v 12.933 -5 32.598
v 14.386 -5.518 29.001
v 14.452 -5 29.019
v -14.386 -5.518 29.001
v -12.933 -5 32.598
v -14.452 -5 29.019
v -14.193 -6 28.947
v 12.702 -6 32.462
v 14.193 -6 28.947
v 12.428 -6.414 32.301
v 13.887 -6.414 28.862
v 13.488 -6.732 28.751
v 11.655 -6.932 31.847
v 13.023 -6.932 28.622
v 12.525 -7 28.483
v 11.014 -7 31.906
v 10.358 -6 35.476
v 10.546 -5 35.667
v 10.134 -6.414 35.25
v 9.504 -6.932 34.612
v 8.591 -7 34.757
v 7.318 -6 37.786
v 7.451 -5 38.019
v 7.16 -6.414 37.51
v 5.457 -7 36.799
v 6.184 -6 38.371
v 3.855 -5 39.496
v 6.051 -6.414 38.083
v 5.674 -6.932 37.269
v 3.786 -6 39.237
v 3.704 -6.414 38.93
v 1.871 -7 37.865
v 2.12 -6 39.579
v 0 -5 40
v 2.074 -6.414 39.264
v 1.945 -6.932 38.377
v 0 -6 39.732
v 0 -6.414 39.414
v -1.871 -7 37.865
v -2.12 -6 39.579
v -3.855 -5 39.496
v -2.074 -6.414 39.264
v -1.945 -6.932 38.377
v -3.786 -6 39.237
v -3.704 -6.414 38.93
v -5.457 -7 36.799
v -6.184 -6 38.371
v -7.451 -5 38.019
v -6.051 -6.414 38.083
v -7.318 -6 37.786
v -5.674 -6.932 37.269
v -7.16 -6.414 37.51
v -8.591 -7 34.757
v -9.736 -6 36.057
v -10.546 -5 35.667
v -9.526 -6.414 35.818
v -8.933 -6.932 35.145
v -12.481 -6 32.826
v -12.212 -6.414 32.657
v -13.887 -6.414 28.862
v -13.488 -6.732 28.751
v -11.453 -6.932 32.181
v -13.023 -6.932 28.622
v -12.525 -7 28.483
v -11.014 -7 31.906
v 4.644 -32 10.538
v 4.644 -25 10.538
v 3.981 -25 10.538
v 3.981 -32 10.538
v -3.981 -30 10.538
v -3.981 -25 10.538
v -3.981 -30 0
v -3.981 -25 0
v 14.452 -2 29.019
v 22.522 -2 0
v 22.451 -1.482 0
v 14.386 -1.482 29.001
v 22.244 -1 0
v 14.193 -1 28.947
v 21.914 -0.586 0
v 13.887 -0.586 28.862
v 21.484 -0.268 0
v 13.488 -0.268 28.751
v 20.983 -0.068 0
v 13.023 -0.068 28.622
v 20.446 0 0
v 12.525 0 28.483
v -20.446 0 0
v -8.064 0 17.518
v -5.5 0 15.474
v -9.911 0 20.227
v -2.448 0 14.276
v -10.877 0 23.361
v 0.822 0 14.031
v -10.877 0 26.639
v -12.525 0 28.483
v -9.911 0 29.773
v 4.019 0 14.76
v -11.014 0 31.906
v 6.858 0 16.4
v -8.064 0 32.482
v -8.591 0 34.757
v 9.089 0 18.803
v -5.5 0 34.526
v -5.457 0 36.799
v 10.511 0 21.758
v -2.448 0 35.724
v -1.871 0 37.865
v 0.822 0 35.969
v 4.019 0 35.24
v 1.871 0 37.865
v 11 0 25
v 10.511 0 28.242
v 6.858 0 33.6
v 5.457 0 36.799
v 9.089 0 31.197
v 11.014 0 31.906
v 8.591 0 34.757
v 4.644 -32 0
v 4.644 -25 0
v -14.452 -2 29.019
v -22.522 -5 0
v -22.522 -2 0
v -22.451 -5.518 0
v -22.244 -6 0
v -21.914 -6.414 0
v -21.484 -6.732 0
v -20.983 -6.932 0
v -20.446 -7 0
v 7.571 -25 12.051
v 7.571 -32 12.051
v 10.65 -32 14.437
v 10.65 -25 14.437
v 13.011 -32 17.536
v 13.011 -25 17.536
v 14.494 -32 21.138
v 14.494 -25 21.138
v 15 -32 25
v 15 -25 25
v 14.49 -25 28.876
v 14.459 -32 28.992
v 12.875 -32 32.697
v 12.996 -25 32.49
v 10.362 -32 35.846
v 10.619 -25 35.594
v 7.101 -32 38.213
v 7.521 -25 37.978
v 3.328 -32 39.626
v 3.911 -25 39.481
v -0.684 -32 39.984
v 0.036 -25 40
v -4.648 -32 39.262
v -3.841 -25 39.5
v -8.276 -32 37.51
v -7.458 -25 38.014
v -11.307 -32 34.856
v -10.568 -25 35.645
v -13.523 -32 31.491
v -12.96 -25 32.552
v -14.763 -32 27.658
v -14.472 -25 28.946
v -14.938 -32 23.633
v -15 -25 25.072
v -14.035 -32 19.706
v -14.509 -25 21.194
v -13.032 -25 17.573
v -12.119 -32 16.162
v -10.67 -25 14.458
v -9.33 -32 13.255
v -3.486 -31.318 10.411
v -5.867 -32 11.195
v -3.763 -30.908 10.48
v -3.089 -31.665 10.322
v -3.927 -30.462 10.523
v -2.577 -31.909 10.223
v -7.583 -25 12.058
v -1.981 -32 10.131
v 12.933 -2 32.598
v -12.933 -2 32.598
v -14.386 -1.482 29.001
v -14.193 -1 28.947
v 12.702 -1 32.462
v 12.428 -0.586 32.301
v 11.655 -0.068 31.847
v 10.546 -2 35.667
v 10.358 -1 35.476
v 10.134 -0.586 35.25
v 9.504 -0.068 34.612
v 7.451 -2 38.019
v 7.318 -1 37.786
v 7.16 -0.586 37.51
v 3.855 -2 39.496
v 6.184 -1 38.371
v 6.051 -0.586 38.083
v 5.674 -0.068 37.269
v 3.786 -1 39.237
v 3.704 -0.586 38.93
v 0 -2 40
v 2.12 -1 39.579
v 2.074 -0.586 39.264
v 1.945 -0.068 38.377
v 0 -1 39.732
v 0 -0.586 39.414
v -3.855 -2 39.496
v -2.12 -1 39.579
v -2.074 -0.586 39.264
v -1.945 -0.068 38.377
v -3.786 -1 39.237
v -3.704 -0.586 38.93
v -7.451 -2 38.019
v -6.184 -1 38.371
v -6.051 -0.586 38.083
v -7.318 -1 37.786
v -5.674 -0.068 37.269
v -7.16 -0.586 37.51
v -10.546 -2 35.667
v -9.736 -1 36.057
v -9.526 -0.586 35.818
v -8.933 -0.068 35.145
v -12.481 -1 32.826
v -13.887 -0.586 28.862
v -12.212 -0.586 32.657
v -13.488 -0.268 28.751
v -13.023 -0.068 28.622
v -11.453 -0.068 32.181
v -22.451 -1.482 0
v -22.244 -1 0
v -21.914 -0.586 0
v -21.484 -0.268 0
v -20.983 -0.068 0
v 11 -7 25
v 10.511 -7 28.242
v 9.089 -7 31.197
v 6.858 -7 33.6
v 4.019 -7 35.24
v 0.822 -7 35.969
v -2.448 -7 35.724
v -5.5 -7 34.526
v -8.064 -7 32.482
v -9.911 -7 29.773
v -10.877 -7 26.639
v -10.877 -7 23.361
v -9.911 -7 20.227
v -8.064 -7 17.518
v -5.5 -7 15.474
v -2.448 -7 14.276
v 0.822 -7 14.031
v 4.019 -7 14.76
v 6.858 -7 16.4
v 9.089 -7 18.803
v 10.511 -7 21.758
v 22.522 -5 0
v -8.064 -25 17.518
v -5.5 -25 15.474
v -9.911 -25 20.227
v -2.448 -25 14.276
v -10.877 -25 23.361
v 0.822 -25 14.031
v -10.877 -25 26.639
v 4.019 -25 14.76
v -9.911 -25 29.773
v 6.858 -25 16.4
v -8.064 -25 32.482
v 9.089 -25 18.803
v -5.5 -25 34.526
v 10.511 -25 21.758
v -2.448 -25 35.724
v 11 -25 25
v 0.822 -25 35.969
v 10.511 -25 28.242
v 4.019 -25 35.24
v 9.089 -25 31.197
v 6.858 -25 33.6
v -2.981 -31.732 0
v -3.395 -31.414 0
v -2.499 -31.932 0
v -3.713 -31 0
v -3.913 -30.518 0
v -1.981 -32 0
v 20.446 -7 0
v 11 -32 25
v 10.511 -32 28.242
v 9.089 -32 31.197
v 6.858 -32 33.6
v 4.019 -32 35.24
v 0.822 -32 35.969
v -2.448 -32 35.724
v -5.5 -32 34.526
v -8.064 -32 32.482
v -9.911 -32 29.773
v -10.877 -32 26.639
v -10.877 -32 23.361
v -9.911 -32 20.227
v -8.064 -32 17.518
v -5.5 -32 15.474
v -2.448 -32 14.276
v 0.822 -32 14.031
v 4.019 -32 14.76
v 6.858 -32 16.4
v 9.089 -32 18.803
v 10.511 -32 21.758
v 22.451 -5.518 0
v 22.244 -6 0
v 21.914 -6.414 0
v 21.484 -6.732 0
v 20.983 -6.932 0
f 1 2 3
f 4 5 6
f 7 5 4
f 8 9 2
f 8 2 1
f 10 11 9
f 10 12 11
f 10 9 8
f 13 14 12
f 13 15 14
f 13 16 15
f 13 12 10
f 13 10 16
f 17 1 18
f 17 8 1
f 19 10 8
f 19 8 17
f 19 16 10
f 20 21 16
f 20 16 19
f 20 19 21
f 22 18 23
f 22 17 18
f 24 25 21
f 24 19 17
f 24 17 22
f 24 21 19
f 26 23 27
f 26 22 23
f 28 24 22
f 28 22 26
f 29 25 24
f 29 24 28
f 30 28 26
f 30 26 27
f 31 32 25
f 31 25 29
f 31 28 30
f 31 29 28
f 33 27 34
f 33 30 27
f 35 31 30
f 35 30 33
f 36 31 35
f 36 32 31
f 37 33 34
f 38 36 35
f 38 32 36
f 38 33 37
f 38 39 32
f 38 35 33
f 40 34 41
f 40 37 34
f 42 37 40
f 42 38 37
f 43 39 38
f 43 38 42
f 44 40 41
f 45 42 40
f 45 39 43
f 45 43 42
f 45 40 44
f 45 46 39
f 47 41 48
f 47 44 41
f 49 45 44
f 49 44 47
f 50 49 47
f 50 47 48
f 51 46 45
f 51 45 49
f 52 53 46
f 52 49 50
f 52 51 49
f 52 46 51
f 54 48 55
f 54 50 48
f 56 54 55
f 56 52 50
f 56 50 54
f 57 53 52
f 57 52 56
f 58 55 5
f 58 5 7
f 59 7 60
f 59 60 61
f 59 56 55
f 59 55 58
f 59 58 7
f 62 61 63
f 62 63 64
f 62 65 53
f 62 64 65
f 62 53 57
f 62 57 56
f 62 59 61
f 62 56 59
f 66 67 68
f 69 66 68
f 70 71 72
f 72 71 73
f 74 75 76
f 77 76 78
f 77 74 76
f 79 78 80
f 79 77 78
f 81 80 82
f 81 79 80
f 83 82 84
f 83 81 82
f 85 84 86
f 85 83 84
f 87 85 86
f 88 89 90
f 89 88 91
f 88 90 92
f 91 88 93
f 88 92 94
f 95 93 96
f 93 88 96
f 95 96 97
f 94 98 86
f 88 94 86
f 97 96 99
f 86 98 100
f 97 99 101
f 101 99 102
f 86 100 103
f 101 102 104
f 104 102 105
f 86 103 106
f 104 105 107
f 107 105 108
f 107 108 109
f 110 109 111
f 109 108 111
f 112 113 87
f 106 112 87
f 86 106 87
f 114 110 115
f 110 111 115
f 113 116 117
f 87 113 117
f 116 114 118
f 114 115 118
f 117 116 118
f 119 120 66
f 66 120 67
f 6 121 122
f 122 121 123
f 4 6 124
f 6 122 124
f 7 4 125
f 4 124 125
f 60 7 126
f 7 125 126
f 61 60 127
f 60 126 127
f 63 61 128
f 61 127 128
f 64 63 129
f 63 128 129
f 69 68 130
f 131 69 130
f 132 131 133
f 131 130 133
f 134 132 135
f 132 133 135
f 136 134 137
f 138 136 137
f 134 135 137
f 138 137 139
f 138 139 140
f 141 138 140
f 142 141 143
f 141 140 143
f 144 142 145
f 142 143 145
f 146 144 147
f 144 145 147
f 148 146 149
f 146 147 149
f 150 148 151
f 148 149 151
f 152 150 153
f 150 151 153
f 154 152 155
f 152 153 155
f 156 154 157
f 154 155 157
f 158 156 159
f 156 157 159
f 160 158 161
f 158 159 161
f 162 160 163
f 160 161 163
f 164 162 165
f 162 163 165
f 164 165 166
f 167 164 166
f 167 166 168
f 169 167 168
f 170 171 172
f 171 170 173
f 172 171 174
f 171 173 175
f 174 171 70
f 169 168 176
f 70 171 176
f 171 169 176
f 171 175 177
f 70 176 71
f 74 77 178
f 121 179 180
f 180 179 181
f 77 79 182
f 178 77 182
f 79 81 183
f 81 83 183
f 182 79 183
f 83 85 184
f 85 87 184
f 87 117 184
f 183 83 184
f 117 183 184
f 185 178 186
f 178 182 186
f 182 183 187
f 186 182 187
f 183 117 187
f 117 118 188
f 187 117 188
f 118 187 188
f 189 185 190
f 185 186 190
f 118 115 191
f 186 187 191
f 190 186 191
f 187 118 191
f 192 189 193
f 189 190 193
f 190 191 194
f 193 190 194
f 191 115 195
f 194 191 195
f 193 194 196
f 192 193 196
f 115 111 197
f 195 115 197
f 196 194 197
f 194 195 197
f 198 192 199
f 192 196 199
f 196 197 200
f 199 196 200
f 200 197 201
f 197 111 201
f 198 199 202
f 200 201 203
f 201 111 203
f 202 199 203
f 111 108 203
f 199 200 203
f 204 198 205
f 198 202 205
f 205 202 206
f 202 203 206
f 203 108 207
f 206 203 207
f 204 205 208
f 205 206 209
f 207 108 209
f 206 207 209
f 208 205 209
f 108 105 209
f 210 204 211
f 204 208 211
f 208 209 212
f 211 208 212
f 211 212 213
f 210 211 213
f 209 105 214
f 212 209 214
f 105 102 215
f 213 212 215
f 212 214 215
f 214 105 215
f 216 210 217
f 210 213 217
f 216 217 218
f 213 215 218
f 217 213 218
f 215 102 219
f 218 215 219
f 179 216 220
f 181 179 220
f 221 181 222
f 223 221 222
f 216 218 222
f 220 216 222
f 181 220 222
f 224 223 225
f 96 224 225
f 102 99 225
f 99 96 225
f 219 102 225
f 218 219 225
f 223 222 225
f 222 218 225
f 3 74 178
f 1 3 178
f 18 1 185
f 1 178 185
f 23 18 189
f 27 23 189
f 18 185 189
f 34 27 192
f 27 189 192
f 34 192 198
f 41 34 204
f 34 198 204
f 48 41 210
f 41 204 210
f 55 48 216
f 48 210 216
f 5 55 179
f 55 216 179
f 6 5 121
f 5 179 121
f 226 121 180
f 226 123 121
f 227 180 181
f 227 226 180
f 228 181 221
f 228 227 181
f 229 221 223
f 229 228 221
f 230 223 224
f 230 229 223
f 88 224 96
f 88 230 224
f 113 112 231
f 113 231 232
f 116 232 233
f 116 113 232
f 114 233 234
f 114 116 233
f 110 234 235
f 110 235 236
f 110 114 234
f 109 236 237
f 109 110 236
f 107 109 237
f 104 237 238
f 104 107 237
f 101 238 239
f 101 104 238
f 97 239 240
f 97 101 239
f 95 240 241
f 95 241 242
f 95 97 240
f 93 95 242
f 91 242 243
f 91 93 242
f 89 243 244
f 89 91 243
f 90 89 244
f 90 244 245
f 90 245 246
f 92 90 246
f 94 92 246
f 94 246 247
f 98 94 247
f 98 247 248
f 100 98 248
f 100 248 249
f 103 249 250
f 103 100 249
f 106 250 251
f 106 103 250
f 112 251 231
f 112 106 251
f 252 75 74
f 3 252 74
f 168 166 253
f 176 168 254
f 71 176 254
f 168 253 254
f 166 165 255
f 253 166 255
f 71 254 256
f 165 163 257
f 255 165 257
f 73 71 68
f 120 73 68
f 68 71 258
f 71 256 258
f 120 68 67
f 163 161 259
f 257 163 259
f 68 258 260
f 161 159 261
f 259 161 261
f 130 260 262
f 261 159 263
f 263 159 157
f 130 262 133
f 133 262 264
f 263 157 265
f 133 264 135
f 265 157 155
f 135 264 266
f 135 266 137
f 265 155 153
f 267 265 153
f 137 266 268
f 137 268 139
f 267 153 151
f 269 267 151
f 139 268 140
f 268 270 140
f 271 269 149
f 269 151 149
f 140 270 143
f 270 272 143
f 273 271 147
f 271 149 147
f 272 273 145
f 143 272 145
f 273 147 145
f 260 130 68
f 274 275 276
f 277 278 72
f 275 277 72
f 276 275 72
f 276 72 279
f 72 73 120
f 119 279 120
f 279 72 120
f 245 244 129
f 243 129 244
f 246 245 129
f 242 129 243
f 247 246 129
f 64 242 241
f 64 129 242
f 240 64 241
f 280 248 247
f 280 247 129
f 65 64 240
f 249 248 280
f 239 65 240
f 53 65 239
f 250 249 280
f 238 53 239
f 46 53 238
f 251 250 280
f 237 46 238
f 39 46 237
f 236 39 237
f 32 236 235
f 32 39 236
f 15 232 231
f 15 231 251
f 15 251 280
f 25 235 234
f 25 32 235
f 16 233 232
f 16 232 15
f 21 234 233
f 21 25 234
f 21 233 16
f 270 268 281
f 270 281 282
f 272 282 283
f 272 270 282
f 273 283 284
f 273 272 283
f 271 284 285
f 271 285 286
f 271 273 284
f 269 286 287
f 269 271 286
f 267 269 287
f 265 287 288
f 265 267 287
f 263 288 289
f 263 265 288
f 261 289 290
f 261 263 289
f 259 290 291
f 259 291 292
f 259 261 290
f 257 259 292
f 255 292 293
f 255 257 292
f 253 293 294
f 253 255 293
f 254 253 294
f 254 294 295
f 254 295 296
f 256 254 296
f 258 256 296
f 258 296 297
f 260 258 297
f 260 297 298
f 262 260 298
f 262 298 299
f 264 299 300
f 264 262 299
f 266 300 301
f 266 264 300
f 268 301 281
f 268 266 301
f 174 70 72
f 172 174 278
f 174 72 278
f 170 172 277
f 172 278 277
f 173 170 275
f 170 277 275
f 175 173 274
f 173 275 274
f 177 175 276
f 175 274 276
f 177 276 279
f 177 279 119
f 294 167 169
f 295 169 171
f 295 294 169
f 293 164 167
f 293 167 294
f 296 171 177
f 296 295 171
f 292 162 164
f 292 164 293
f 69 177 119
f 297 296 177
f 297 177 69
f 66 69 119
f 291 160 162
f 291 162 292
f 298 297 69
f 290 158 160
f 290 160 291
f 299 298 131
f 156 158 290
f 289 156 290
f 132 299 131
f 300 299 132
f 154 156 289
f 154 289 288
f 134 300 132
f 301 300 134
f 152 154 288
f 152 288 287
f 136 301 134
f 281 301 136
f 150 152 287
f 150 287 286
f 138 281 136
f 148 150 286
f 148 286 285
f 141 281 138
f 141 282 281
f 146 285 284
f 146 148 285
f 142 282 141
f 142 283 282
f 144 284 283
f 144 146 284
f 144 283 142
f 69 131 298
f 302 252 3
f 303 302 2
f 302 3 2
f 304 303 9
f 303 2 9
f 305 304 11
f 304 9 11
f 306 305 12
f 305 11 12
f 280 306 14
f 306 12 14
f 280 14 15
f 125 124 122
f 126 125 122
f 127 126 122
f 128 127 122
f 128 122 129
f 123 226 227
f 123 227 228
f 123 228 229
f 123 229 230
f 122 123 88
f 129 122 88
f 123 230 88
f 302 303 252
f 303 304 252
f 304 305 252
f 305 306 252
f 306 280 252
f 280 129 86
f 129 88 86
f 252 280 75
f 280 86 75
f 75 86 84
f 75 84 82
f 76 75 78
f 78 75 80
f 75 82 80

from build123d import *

# Parameters (mm, degrees)
F0_R     = 11
F2_DEPTH = 7
F4_R     = 11
F5_DEPTH = 7
F6_R     = 2
F6_2_R   = 2


with BuildPart() as f2:
    # F0 (on Front) → F2 (new body)
    with BuildSketch(Plane.XZ):
        with BuildLine():
            ThreePointArc((14.4515297125, 29.0191154462), (14.8622499253, 27.0281832157), (15, 25))
            ThreePointArc((15, 25), (-2.0281832157, 10.1377500747), (-14.4515297125, 29.0191154462))
            Line((-14.4515297125, 29.0191154462), (-22.5220369491, 0))
            Line((-22.5220369491, 0), (0, 0))
            Line((0, 0), (22.5220369491, 0))
            Line((22.5220369491, 0), (14.4515297125, 29.0191154462))
        make_face()
        with BuildLine():
            ThreePointArc((-14.4515297125, 29.0191154462), (-2.0281832157, 10.1377500747), (15, 25))
            ThreePointArc((15, 25), (14.8622499253, 27.0281832157), (14.4515297125, 29.0191154462))
            ThreePointArc((14.4515297125, 29.0191154462), (0, 40), (-14.4515297125, 29.0191154462))
        make_face()
        with Locations((0, 25)):
            Circle(F0_R, mode=Mode.SUBTRACT)
    extrude(amount=F2_DEPTH)

    # F6
    f6_edges = [f2.edges().sort_by_distance(p)[0] for p in [
        (-18.486783, -7, 14.509558),
        (18.486783, 0, 14.509558),
    ]]
    fillet(f6_edges, radius=F6_R)


with BuildPart() as f5:
    # F4 (on offset) → F5 (new body)
    with BuildSketch(Plane.XZ.offset(25)):
        with BuildLine():
            ThreePointArc((3.9812427399, 10.5379909333), (11.9314425175, 15.9093080873), (15, 25))
            ThreePointArc((15, 25), (-9.0906919127, 36.9314425175), (-3.9812427399, 10.5379909333))
            Line((-3.9812427399, 10.5379909333), (3.9812427399, 10.5379909333))
        make_face()
        with Locations((0, 25)):
            Circle(F4_R, mode=Mode.SUBTRACT)
        with BuildLine():
            Line((3.9812427399, 10.5379909333), (-3.9812427399, 10.5379909333))
            ThreePointArc((-3.9812427399, 10.5379909333), (0, 10), (3.9812427399, 10.5379909333))
        make_face()
        with BuildLine():
            ThreePointArc((3.9812427399, 10.5379909333), (0, 10), (-3.9812427399, 10.5379909333))
            Line((-3.9812427399, 10.5379909333), (-3.9812427399, 0))
            Line((-3.9812427399, 0), (4.6436069533, 0))
            Line((4.6436069533, 0), (4.6436069533, 10.5379909333))
            Line((4.6436069533, 10.5379909333), (3.9812427399, 10.5379909333))
        make_face()
    extrude(amount=F5_DEPTH)

    # F6#2
    f6_2_edges = [f5.edges().sort_by_distance(p)[0] for p in [
        (-3.981243, -32, 5.268995),
    ]]
    fillet(f6_2_edges, radius=F6_2_R)


solid = Compound([f2.part, f5.part])
